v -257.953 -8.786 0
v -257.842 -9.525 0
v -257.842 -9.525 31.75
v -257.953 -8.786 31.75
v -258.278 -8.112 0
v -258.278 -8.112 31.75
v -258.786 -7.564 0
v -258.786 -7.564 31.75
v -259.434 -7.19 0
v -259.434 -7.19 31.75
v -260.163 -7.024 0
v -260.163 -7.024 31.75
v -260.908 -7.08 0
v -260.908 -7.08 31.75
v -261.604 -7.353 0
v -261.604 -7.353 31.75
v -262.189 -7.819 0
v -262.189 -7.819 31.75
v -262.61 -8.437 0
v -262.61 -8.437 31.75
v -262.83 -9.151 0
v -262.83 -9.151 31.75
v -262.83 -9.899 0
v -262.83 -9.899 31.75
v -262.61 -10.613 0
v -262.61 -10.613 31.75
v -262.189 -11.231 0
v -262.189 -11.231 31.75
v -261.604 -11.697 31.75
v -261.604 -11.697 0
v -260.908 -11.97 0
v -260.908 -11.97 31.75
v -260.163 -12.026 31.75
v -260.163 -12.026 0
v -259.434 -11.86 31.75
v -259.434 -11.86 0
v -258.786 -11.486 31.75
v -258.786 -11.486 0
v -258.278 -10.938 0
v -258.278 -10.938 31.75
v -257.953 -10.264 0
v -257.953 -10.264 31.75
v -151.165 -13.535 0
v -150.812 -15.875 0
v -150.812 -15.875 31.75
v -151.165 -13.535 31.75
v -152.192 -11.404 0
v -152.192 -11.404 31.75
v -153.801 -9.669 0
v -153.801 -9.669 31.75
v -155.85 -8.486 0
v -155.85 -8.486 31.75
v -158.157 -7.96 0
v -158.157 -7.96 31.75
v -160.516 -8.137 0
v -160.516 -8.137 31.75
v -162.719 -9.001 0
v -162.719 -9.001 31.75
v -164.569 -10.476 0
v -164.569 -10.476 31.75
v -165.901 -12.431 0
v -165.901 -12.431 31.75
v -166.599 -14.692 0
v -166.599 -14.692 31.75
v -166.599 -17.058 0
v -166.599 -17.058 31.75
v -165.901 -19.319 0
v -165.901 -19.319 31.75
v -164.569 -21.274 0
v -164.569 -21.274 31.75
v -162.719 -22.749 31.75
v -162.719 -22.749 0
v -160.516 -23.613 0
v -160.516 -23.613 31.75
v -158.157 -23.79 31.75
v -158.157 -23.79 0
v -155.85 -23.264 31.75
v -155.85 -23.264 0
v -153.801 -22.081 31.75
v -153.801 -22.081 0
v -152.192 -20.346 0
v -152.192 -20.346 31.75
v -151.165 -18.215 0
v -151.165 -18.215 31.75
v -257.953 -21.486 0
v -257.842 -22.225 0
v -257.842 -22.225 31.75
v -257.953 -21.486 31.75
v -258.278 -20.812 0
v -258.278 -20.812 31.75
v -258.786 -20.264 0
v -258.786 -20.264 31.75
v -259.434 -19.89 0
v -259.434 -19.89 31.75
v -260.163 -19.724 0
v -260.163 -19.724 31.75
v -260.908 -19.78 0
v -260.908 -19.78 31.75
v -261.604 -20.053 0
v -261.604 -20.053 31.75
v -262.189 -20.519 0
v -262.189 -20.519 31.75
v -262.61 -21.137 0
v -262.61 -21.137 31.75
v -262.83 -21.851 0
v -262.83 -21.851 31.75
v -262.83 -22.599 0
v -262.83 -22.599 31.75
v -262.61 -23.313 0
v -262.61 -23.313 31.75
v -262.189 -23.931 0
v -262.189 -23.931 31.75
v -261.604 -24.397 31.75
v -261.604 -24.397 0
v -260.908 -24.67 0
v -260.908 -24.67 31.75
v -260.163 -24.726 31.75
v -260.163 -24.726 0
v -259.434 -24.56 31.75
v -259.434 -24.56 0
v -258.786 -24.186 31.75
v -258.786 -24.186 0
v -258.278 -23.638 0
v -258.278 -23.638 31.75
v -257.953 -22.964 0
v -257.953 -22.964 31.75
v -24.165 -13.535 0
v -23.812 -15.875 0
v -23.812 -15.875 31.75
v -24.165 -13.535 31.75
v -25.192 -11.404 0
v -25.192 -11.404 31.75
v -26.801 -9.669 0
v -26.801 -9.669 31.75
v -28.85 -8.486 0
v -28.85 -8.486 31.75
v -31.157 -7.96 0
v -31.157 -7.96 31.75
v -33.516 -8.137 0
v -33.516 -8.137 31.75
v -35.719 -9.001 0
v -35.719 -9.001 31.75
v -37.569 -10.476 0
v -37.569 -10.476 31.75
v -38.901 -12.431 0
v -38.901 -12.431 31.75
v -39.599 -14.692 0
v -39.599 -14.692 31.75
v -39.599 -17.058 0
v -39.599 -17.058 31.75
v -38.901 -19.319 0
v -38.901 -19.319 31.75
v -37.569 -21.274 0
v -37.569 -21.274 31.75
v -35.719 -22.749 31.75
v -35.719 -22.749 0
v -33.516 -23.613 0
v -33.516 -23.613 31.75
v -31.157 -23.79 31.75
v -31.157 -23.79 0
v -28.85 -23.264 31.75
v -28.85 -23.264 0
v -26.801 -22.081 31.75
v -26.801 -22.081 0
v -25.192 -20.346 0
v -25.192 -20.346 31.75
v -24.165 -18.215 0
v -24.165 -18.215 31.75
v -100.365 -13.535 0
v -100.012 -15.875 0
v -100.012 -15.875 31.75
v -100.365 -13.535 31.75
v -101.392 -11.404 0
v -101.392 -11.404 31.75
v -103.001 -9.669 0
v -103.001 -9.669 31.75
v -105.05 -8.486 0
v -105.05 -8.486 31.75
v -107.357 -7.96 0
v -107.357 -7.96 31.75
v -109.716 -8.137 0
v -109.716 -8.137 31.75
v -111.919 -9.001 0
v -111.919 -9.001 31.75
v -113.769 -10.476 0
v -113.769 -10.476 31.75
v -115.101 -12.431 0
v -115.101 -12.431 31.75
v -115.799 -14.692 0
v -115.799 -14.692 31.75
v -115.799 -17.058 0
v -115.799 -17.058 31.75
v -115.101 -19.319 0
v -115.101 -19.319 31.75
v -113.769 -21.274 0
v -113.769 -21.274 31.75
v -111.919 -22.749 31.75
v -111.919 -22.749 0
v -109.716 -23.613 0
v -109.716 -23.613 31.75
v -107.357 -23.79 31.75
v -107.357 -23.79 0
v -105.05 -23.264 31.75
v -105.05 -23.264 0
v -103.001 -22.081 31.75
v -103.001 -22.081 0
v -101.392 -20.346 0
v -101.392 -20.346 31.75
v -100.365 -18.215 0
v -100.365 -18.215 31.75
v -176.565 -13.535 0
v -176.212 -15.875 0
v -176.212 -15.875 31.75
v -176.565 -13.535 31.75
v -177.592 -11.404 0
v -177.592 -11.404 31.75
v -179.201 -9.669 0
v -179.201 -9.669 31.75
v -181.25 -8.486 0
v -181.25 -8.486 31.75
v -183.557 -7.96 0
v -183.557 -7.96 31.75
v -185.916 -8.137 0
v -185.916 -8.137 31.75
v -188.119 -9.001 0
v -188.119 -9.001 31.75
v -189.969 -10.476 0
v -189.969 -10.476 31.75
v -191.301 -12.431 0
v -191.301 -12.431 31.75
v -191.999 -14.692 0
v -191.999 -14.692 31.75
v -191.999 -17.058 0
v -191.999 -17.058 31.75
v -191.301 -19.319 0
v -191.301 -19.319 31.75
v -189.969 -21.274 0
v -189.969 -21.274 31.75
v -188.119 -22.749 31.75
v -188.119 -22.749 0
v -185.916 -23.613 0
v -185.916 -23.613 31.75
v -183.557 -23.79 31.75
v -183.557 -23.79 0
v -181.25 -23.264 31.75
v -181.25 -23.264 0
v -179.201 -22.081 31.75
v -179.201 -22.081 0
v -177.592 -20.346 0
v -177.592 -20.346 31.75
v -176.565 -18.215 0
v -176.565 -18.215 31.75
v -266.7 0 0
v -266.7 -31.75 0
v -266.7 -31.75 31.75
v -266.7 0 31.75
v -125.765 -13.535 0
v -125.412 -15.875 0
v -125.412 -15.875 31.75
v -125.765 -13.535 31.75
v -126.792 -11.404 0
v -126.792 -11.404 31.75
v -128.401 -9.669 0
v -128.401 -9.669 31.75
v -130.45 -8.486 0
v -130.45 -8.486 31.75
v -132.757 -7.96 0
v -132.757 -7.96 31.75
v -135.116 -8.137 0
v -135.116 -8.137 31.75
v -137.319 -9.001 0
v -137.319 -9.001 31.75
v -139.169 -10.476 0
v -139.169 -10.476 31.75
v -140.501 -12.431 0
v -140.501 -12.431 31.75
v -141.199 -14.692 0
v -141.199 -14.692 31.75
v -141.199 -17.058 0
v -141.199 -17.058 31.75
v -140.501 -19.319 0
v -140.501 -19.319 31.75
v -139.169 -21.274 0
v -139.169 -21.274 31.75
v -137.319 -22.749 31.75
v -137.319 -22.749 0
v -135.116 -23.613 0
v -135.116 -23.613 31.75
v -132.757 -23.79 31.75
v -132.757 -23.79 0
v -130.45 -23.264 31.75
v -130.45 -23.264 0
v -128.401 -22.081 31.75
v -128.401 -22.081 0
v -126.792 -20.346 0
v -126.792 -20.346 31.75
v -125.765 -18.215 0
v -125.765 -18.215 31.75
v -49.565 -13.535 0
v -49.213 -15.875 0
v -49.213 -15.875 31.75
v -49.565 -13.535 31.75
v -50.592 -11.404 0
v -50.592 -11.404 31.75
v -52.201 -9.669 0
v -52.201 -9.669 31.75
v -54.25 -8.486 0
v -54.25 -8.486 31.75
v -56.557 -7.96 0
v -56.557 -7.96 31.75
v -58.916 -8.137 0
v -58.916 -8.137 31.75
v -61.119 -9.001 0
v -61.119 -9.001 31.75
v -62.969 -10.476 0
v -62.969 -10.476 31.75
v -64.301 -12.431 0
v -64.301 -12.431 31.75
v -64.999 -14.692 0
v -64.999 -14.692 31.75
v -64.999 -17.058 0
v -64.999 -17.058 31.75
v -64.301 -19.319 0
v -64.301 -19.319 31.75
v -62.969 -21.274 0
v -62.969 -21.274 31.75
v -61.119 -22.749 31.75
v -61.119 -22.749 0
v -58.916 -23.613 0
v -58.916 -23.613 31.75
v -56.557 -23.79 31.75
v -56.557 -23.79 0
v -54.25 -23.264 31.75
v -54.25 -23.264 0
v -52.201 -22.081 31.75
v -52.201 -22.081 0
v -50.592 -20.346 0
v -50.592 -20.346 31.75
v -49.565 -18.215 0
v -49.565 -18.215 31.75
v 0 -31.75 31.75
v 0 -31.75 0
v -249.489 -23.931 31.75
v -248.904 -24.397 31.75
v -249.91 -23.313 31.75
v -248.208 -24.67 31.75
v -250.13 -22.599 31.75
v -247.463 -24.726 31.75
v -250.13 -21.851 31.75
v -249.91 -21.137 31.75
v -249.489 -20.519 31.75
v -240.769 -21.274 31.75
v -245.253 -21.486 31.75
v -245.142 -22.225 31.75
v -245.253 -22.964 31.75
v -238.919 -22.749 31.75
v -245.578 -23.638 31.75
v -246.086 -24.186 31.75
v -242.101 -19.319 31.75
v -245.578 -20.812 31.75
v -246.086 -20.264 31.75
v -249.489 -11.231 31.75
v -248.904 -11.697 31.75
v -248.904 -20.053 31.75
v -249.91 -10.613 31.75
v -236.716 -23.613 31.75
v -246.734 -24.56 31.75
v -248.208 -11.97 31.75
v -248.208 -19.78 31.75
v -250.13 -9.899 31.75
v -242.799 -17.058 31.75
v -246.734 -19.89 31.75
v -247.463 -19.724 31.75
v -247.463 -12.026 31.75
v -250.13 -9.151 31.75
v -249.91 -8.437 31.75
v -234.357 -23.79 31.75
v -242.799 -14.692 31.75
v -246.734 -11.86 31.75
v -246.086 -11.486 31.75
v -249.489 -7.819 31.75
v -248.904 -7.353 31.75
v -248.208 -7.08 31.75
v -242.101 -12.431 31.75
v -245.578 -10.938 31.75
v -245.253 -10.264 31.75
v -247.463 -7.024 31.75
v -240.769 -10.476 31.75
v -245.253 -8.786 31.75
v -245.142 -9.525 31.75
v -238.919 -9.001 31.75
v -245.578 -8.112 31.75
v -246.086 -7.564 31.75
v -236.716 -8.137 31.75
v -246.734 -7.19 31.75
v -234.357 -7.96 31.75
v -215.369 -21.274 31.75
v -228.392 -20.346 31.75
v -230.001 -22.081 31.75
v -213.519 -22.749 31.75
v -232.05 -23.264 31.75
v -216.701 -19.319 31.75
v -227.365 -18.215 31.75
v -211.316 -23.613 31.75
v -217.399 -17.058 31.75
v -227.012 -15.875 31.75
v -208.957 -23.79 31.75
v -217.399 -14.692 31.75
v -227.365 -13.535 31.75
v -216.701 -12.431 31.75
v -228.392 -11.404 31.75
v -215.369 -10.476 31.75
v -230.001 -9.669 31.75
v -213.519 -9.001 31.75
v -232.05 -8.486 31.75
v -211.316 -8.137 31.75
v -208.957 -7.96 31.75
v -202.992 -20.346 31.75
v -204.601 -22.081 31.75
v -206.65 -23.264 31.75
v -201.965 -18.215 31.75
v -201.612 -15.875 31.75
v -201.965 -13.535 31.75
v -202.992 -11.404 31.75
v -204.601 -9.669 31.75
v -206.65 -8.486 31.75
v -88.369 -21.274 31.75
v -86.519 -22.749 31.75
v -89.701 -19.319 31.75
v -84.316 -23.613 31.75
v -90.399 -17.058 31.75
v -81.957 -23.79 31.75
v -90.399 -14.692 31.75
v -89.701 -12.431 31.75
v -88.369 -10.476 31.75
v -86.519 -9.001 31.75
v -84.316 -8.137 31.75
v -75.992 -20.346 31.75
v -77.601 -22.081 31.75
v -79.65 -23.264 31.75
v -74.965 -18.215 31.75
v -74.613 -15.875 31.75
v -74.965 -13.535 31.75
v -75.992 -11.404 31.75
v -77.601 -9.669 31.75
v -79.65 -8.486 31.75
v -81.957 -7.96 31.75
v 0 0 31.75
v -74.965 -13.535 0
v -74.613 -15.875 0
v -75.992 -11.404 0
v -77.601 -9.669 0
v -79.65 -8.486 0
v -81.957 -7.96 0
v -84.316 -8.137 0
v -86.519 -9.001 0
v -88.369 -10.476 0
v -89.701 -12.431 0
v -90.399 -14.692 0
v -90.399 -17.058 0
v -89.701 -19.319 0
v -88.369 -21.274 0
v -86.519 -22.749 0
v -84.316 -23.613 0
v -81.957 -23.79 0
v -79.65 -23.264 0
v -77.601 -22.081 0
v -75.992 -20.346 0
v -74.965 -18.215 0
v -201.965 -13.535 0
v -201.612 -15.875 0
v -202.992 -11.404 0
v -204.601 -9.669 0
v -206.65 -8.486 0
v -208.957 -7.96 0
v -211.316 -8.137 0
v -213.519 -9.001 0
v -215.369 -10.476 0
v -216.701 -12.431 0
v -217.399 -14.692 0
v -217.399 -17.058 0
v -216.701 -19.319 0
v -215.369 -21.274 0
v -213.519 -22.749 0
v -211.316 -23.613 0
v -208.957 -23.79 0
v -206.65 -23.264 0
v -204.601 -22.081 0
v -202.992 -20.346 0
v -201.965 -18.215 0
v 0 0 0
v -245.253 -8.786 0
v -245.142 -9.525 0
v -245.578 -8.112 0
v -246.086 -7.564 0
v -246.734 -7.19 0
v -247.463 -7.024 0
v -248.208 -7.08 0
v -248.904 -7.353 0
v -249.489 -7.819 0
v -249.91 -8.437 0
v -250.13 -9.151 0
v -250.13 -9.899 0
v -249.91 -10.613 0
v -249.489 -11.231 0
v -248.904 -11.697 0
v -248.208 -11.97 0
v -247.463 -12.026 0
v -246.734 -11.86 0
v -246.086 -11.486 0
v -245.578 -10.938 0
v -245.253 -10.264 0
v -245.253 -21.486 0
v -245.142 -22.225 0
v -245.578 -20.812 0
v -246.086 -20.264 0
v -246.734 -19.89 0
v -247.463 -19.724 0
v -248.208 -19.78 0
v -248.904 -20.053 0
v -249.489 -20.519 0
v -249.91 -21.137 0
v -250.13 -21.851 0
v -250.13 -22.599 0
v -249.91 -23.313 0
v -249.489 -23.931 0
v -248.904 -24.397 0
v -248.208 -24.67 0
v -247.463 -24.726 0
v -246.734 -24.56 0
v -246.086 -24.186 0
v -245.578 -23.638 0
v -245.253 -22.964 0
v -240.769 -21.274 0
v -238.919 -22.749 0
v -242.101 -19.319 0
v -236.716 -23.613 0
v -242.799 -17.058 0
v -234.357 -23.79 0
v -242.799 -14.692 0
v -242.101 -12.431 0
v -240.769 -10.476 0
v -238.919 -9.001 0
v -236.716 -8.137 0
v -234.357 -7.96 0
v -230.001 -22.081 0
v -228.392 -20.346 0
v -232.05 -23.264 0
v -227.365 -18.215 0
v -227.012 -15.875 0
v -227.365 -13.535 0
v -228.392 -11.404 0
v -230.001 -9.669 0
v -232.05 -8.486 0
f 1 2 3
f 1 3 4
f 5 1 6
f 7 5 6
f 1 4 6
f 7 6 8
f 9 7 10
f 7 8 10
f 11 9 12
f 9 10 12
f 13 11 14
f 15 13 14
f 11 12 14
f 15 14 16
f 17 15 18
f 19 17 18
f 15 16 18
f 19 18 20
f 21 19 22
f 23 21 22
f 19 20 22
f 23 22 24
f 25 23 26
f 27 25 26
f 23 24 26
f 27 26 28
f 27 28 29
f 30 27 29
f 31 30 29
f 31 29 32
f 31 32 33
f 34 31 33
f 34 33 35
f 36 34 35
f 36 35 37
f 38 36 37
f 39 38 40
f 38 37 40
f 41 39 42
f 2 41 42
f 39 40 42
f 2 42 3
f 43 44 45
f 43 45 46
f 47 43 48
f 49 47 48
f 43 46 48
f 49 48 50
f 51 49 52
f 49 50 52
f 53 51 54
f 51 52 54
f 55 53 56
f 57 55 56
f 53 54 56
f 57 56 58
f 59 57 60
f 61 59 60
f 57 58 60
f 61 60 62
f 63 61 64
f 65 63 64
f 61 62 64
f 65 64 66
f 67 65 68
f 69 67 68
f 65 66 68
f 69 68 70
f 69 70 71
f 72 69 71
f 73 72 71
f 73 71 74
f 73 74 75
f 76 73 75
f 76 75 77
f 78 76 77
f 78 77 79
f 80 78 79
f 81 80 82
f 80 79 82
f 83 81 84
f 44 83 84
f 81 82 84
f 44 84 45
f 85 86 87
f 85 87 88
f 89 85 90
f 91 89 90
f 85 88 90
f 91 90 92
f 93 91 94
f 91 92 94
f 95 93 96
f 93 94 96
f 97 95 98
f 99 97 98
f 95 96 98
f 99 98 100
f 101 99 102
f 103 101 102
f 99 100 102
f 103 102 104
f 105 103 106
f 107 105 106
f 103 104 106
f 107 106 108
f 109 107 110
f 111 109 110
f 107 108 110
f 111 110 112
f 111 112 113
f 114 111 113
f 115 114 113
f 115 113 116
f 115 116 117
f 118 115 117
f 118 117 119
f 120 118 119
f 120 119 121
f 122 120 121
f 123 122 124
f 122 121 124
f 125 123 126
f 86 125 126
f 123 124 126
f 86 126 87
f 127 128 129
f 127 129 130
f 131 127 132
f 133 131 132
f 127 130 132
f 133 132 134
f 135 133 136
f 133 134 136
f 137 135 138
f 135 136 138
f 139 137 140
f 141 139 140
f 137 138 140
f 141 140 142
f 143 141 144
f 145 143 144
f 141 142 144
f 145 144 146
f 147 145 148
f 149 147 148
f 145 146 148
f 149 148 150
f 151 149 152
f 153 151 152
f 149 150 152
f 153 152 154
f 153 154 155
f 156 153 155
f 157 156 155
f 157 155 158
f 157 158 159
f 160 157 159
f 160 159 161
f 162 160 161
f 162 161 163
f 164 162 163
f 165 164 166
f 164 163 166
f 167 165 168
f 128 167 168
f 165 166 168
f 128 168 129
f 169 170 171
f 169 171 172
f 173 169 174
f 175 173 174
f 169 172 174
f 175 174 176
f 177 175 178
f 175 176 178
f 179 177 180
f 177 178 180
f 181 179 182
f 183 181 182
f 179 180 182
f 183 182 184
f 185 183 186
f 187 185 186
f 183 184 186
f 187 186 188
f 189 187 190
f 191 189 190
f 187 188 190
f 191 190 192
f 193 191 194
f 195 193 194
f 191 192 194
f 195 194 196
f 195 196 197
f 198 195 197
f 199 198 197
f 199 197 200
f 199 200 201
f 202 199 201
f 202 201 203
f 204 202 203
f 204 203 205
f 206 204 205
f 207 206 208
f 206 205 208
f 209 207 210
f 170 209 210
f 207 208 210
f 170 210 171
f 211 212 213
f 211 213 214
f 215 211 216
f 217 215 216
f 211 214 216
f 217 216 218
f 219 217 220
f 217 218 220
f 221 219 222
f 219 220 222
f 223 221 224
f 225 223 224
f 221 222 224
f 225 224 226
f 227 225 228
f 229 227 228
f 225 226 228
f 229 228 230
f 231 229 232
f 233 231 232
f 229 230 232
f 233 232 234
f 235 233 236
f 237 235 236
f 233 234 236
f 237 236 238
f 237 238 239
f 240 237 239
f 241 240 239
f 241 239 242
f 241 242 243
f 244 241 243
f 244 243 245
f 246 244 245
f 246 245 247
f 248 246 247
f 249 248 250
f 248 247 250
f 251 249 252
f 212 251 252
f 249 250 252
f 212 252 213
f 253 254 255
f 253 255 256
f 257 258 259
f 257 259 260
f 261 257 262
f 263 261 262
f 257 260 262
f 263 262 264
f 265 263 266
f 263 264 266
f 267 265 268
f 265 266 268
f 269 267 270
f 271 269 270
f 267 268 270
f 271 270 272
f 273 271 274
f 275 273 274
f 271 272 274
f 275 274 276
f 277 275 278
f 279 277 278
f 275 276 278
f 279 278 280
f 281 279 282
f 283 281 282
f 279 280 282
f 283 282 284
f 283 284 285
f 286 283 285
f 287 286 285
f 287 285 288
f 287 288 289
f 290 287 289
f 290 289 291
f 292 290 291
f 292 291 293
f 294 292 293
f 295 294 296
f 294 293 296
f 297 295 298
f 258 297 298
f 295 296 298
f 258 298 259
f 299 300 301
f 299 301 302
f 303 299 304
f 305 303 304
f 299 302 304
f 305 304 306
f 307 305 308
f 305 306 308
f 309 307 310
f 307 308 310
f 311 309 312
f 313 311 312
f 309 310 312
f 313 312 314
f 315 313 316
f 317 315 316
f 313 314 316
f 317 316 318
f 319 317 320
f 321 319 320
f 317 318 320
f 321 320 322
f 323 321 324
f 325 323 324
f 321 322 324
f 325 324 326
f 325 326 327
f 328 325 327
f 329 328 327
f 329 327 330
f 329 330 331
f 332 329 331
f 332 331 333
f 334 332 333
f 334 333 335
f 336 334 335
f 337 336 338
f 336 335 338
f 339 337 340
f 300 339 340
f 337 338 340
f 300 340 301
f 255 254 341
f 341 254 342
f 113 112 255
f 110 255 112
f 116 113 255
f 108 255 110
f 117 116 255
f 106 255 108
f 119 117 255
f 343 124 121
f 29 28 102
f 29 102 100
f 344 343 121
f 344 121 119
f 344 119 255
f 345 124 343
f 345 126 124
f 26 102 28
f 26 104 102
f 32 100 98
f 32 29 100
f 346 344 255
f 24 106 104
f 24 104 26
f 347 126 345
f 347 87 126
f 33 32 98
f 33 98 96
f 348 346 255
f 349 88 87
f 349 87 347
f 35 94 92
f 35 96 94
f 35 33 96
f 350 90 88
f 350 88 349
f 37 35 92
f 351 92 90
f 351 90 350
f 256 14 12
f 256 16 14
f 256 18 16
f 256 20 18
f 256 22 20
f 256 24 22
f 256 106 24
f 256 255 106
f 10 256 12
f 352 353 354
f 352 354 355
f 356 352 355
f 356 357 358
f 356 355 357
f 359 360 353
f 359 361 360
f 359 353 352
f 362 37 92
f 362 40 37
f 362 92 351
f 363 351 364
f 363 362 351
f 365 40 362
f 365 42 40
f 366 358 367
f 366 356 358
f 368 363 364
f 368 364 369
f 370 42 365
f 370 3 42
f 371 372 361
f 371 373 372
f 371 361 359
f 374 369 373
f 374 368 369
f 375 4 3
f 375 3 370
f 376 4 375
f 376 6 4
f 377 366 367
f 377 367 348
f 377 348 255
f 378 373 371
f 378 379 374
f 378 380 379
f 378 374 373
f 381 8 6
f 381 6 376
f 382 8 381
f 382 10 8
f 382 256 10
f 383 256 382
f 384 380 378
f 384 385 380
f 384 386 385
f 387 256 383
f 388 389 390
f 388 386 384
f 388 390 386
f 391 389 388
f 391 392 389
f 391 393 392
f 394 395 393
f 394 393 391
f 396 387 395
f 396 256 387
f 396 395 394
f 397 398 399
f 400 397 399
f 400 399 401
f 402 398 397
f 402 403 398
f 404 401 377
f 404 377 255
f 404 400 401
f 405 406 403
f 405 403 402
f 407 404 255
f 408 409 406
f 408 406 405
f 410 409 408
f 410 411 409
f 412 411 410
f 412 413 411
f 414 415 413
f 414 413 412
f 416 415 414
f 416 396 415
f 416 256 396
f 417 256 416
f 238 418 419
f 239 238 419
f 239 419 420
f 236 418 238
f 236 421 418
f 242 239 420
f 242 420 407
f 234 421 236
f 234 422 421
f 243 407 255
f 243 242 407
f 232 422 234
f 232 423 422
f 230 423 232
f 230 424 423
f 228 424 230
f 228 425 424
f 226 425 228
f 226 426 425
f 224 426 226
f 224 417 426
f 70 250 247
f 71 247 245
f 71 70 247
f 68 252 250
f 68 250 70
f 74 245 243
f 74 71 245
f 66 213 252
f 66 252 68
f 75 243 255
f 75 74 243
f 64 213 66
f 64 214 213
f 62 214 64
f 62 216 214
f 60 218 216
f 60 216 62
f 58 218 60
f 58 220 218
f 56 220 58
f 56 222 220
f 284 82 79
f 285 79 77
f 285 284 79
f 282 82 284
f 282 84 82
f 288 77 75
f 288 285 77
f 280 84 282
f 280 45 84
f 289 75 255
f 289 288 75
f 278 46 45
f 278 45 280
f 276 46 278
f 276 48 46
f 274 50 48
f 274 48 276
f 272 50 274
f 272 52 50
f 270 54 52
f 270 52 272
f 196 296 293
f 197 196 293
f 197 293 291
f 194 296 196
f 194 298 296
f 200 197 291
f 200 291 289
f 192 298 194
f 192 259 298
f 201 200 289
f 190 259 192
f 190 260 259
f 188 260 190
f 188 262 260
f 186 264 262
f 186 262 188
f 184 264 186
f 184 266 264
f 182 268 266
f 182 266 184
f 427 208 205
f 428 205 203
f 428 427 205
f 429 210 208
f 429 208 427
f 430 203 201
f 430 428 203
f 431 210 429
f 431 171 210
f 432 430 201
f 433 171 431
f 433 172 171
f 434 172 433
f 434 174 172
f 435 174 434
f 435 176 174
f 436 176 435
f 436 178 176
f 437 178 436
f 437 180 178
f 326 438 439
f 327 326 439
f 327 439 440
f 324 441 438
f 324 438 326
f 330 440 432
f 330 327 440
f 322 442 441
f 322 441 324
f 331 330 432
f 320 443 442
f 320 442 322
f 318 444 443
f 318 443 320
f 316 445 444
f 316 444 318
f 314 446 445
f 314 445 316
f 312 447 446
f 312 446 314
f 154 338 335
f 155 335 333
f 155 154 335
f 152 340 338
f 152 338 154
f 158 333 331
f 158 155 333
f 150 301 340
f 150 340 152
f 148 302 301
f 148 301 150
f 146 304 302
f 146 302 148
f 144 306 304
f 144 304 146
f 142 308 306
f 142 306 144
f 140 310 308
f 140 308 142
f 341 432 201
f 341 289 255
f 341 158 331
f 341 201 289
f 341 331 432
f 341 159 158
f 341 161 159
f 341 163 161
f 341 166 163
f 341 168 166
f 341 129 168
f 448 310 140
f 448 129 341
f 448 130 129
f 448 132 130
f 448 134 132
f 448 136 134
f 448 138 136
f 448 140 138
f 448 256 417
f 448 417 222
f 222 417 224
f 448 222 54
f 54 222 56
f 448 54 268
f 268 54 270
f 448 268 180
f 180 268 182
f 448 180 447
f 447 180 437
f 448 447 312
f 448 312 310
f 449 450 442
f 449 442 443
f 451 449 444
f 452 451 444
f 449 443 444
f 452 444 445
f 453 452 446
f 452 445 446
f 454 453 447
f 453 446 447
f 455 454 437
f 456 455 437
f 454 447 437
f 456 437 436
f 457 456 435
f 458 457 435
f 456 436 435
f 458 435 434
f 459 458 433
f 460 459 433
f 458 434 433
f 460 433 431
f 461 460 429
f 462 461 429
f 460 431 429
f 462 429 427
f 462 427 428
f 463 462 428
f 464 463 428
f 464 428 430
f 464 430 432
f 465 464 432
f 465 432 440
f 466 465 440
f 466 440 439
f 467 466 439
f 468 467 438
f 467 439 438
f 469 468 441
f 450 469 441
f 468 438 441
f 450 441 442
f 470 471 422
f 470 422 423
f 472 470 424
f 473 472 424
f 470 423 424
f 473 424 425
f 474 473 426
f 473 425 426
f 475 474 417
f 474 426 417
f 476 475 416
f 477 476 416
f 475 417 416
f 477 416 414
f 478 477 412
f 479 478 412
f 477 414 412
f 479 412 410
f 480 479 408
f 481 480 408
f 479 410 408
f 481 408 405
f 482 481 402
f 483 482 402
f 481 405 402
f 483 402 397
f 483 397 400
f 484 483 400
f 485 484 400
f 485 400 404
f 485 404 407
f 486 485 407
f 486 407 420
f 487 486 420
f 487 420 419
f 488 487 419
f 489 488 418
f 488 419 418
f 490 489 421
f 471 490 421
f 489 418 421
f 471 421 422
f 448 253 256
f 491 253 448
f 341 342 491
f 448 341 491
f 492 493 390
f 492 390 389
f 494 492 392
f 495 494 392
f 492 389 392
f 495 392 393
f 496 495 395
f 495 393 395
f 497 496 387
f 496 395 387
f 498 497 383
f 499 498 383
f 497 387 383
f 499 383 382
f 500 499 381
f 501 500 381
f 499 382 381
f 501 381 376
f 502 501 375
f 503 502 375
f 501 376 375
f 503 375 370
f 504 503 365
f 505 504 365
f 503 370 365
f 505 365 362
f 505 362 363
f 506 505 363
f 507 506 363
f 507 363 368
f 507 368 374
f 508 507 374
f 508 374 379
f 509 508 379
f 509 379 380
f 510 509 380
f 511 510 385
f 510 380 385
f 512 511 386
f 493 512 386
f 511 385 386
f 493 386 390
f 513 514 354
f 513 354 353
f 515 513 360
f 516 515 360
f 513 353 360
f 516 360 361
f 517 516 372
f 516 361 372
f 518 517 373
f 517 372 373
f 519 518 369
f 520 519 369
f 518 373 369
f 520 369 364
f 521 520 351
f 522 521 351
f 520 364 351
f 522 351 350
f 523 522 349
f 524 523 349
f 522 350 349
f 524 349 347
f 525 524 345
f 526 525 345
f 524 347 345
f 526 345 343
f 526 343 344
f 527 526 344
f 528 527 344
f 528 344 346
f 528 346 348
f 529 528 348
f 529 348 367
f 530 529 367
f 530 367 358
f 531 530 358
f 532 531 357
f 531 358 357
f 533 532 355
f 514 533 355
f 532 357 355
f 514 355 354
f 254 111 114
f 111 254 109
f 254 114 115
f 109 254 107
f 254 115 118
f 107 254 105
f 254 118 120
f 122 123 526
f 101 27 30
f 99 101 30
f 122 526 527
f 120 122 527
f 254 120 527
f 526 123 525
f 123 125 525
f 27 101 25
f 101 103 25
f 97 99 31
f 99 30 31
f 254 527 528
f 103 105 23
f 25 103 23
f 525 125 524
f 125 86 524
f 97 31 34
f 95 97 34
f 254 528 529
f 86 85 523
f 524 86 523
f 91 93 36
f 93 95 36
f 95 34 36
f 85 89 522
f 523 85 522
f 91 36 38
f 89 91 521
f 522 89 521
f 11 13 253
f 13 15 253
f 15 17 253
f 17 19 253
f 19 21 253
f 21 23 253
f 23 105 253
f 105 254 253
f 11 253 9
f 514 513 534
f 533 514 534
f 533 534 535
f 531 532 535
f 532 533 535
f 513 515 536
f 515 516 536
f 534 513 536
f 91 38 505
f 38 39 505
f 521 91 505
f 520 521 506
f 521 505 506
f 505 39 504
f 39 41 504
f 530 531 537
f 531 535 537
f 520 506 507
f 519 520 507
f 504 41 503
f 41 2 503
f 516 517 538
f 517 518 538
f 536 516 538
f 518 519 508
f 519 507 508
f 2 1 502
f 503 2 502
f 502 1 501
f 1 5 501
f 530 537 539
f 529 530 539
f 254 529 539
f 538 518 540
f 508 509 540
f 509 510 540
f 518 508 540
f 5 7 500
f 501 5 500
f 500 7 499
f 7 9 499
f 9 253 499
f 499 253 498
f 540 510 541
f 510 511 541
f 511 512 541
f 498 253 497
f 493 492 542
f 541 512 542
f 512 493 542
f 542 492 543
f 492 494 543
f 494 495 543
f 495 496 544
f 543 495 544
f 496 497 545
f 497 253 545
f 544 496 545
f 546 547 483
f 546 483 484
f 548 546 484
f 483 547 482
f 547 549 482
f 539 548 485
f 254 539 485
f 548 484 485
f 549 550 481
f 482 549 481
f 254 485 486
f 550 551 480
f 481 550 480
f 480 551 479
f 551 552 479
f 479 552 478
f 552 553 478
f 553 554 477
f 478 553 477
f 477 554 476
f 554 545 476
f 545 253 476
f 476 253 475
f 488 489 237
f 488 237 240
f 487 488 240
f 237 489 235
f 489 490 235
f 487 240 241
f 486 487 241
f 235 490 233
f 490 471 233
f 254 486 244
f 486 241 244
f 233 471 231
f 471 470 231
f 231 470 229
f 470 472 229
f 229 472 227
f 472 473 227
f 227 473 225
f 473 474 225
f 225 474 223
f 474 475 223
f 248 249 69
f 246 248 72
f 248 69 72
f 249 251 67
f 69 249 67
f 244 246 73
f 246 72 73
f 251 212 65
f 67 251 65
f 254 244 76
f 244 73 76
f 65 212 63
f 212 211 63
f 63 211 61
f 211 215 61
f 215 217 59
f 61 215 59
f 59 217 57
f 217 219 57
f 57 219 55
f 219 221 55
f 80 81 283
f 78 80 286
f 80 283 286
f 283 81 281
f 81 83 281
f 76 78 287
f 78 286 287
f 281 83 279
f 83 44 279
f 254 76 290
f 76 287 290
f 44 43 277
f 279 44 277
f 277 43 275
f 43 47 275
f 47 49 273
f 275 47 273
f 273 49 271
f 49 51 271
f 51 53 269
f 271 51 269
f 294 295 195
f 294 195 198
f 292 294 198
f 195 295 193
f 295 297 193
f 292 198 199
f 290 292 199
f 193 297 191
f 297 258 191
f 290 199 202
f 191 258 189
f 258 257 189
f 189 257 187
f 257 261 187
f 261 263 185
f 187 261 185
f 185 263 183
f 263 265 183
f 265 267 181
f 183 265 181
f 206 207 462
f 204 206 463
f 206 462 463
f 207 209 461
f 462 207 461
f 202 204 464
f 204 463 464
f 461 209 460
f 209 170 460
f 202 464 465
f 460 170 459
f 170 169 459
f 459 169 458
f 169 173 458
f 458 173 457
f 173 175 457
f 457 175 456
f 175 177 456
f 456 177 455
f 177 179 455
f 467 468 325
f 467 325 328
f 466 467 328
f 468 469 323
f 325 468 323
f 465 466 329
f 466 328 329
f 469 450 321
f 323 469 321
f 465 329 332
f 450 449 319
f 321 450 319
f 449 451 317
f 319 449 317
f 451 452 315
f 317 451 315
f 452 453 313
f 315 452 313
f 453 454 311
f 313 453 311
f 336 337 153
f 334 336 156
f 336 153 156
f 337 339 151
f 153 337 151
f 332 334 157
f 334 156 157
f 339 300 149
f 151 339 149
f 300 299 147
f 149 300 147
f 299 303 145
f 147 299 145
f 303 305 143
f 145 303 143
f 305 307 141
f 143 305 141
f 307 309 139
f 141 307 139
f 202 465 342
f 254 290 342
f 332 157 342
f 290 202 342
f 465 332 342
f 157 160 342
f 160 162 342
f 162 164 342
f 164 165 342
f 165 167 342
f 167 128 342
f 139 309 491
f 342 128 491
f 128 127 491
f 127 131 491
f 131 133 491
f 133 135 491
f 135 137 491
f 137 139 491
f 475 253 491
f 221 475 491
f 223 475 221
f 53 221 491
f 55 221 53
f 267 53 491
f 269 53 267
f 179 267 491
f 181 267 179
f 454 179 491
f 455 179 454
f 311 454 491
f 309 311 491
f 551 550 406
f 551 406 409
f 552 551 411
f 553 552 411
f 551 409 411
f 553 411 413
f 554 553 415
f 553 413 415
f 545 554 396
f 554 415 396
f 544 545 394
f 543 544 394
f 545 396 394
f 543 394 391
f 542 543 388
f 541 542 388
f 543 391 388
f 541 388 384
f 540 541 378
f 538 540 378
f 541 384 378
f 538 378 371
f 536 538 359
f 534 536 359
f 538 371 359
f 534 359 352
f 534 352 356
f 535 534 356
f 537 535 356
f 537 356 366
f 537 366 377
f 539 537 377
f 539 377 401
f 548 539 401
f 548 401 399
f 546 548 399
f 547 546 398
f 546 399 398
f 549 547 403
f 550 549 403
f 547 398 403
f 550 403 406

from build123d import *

# Parameters (mm, degrees)
SKETCH1_W           = 266.7
SKETCH1_H           = 31.75
BOSS_EXTRUDE1_DEPTH = 31.75
SKETCH2_R           = 7.9375
CUT_EXTRUDE1_DEPTH  = 31.75
LPATTERN1_COUNT     = 9
LPATTERN1_PITCH     = 25.4
SKETCH3_R           = 2.50825
CUT_EXTRUDE2_DEPTH  = 31.75


with BuildPart() as part:
    # Sketch1 → Boss-Extrude1 (new body)
    with BuildSketch(Plane.XY):
        with Locations((-133.35, -15.875)):
            Rectangle(SKETCH1_W, SKETCH1_H)
    extrude(amount=BOSS_EXTRUDE1_DEPTH)

    # Sketch2 → Cut-Extrude1 (cut)
    with BuildSketch(Plane.XY.offset(31.75)):
        with Locations((-234.95, -15.875)):
            Circle(SKETCH2_R)
    cut_extrude1 = extrude(amount=-CUT_EXTRUDE1_DEPTH, mode=Mode.SUBTRACT)

    # LPattern1: Cut-Extrude1 ×9
    with Locations(*[(i * LPATTERN1_PITCH, 0, 0) for i in range(1, LPATTERN1_COUNT)]):
        add(cut_extrude1, mode=Mode.SUBTRACT)

    # Sketch3 → Cut-Extrude2 (cut)
    with BuildSketch(Plane.XY.offset(31.75)):
        with Locations((-260.35, -9.525)):
            Circle(SKETCH3_R)
        with Locations((-247.65, -9.525)):
            Circle(SKETCH3_R)
        with Locations((-260.35, -22.225)):
            Circle(SKETCH3_R)
        with Locations((-247.65, -22.225)):
            Circle(SKETCH3_R)
    extrude(amount=-CUT_EXTRUDE2_DEPTH, mode=Mode.SUBTRACT)


solid = part.part
